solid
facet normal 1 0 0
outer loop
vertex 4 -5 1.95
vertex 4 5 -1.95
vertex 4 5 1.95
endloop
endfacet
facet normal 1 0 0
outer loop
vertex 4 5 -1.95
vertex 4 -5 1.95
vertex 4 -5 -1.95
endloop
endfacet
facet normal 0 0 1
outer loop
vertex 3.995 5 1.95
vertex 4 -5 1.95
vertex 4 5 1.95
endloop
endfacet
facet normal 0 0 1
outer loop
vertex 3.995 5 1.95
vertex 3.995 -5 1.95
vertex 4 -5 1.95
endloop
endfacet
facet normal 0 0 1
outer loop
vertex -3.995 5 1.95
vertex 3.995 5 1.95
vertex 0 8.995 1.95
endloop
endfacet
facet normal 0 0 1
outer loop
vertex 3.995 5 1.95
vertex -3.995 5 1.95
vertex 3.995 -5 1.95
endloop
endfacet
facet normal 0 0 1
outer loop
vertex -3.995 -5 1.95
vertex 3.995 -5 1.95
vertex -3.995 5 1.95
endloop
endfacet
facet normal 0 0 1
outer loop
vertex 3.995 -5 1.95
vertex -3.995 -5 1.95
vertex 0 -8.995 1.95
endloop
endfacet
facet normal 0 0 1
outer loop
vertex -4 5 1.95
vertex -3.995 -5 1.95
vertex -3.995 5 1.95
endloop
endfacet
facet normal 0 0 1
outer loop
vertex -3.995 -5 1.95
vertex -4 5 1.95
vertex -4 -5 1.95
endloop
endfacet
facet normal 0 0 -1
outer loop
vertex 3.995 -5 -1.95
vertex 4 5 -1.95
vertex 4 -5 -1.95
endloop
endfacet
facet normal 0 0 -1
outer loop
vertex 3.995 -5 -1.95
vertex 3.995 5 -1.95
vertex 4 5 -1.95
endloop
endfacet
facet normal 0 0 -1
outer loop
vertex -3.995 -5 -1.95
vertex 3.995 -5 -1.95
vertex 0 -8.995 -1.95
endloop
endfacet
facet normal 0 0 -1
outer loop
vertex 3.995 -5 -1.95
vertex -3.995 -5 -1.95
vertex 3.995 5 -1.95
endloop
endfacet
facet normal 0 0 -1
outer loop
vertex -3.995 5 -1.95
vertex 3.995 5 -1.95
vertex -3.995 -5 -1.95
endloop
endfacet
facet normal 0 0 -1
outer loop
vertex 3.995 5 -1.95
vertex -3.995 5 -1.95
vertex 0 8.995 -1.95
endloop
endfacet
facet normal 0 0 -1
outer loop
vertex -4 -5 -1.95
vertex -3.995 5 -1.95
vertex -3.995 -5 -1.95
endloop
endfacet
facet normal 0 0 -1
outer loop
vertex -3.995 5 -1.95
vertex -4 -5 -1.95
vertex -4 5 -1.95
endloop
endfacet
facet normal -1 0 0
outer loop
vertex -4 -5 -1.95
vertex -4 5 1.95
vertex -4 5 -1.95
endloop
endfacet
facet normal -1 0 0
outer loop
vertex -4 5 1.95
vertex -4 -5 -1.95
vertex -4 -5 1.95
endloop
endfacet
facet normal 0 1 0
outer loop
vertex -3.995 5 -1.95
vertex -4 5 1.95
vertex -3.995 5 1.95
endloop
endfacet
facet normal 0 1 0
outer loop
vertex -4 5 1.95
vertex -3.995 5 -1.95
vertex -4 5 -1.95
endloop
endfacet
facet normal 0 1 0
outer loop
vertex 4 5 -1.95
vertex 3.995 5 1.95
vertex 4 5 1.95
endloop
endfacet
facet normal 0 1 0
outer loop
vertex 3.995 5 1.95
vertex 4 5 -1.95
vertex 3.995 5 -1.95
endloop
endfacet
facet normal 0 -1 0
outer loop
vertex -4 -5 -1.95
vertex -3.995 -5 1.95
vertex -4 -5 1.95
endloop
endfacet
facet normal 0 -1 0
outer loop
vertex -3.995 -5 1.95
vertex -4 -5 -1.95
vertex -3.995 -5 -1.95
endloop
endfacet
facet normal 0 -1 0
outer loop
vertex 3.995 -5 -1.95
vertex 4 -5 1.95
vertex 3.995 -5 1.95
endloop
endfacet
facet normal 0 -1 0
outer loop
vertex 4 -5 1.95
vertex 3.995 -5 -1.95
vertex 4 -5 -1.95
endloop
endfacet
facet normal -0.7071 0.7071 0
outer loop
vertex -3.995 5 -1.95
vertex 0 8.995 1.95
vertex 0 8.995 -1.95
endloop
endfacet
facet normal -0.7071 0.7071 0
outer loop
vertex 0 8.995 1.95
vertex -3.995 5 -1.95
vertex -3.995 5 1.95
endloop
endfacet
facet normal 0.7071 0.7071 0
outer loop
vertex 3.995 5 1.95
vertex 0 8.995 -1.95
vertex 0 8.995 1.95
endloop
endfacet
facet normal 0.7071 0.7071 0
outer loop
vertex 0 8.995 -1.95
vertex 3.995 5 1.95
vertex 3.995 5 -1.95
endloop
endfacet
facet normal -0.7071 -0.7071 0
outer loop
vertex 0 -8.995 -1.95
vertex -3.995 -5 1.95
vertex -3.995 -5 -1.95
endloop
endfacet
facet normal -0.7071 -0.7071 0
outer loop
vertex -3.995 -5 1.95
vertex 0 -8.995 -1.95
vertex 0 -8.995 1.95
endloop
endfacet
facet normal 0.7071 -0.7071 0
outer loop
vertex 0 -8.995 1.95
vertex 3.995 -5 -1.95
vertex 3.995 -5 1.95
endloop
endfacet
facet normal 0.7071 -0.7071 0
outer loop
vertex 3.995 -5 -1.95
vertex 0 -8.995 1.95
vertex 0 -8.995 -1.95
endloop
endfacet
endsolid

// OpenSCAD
cube([8, 10, 3.9], true);
translate([0, 10/2, 0])
rotate([0, 0, 45])
cube([5.65, 5.65, 3.9], true);
translate([0, -10/2, 0])
rotate([0, 0, 45])
cube([5.65, 5.65, 3.9], true);
